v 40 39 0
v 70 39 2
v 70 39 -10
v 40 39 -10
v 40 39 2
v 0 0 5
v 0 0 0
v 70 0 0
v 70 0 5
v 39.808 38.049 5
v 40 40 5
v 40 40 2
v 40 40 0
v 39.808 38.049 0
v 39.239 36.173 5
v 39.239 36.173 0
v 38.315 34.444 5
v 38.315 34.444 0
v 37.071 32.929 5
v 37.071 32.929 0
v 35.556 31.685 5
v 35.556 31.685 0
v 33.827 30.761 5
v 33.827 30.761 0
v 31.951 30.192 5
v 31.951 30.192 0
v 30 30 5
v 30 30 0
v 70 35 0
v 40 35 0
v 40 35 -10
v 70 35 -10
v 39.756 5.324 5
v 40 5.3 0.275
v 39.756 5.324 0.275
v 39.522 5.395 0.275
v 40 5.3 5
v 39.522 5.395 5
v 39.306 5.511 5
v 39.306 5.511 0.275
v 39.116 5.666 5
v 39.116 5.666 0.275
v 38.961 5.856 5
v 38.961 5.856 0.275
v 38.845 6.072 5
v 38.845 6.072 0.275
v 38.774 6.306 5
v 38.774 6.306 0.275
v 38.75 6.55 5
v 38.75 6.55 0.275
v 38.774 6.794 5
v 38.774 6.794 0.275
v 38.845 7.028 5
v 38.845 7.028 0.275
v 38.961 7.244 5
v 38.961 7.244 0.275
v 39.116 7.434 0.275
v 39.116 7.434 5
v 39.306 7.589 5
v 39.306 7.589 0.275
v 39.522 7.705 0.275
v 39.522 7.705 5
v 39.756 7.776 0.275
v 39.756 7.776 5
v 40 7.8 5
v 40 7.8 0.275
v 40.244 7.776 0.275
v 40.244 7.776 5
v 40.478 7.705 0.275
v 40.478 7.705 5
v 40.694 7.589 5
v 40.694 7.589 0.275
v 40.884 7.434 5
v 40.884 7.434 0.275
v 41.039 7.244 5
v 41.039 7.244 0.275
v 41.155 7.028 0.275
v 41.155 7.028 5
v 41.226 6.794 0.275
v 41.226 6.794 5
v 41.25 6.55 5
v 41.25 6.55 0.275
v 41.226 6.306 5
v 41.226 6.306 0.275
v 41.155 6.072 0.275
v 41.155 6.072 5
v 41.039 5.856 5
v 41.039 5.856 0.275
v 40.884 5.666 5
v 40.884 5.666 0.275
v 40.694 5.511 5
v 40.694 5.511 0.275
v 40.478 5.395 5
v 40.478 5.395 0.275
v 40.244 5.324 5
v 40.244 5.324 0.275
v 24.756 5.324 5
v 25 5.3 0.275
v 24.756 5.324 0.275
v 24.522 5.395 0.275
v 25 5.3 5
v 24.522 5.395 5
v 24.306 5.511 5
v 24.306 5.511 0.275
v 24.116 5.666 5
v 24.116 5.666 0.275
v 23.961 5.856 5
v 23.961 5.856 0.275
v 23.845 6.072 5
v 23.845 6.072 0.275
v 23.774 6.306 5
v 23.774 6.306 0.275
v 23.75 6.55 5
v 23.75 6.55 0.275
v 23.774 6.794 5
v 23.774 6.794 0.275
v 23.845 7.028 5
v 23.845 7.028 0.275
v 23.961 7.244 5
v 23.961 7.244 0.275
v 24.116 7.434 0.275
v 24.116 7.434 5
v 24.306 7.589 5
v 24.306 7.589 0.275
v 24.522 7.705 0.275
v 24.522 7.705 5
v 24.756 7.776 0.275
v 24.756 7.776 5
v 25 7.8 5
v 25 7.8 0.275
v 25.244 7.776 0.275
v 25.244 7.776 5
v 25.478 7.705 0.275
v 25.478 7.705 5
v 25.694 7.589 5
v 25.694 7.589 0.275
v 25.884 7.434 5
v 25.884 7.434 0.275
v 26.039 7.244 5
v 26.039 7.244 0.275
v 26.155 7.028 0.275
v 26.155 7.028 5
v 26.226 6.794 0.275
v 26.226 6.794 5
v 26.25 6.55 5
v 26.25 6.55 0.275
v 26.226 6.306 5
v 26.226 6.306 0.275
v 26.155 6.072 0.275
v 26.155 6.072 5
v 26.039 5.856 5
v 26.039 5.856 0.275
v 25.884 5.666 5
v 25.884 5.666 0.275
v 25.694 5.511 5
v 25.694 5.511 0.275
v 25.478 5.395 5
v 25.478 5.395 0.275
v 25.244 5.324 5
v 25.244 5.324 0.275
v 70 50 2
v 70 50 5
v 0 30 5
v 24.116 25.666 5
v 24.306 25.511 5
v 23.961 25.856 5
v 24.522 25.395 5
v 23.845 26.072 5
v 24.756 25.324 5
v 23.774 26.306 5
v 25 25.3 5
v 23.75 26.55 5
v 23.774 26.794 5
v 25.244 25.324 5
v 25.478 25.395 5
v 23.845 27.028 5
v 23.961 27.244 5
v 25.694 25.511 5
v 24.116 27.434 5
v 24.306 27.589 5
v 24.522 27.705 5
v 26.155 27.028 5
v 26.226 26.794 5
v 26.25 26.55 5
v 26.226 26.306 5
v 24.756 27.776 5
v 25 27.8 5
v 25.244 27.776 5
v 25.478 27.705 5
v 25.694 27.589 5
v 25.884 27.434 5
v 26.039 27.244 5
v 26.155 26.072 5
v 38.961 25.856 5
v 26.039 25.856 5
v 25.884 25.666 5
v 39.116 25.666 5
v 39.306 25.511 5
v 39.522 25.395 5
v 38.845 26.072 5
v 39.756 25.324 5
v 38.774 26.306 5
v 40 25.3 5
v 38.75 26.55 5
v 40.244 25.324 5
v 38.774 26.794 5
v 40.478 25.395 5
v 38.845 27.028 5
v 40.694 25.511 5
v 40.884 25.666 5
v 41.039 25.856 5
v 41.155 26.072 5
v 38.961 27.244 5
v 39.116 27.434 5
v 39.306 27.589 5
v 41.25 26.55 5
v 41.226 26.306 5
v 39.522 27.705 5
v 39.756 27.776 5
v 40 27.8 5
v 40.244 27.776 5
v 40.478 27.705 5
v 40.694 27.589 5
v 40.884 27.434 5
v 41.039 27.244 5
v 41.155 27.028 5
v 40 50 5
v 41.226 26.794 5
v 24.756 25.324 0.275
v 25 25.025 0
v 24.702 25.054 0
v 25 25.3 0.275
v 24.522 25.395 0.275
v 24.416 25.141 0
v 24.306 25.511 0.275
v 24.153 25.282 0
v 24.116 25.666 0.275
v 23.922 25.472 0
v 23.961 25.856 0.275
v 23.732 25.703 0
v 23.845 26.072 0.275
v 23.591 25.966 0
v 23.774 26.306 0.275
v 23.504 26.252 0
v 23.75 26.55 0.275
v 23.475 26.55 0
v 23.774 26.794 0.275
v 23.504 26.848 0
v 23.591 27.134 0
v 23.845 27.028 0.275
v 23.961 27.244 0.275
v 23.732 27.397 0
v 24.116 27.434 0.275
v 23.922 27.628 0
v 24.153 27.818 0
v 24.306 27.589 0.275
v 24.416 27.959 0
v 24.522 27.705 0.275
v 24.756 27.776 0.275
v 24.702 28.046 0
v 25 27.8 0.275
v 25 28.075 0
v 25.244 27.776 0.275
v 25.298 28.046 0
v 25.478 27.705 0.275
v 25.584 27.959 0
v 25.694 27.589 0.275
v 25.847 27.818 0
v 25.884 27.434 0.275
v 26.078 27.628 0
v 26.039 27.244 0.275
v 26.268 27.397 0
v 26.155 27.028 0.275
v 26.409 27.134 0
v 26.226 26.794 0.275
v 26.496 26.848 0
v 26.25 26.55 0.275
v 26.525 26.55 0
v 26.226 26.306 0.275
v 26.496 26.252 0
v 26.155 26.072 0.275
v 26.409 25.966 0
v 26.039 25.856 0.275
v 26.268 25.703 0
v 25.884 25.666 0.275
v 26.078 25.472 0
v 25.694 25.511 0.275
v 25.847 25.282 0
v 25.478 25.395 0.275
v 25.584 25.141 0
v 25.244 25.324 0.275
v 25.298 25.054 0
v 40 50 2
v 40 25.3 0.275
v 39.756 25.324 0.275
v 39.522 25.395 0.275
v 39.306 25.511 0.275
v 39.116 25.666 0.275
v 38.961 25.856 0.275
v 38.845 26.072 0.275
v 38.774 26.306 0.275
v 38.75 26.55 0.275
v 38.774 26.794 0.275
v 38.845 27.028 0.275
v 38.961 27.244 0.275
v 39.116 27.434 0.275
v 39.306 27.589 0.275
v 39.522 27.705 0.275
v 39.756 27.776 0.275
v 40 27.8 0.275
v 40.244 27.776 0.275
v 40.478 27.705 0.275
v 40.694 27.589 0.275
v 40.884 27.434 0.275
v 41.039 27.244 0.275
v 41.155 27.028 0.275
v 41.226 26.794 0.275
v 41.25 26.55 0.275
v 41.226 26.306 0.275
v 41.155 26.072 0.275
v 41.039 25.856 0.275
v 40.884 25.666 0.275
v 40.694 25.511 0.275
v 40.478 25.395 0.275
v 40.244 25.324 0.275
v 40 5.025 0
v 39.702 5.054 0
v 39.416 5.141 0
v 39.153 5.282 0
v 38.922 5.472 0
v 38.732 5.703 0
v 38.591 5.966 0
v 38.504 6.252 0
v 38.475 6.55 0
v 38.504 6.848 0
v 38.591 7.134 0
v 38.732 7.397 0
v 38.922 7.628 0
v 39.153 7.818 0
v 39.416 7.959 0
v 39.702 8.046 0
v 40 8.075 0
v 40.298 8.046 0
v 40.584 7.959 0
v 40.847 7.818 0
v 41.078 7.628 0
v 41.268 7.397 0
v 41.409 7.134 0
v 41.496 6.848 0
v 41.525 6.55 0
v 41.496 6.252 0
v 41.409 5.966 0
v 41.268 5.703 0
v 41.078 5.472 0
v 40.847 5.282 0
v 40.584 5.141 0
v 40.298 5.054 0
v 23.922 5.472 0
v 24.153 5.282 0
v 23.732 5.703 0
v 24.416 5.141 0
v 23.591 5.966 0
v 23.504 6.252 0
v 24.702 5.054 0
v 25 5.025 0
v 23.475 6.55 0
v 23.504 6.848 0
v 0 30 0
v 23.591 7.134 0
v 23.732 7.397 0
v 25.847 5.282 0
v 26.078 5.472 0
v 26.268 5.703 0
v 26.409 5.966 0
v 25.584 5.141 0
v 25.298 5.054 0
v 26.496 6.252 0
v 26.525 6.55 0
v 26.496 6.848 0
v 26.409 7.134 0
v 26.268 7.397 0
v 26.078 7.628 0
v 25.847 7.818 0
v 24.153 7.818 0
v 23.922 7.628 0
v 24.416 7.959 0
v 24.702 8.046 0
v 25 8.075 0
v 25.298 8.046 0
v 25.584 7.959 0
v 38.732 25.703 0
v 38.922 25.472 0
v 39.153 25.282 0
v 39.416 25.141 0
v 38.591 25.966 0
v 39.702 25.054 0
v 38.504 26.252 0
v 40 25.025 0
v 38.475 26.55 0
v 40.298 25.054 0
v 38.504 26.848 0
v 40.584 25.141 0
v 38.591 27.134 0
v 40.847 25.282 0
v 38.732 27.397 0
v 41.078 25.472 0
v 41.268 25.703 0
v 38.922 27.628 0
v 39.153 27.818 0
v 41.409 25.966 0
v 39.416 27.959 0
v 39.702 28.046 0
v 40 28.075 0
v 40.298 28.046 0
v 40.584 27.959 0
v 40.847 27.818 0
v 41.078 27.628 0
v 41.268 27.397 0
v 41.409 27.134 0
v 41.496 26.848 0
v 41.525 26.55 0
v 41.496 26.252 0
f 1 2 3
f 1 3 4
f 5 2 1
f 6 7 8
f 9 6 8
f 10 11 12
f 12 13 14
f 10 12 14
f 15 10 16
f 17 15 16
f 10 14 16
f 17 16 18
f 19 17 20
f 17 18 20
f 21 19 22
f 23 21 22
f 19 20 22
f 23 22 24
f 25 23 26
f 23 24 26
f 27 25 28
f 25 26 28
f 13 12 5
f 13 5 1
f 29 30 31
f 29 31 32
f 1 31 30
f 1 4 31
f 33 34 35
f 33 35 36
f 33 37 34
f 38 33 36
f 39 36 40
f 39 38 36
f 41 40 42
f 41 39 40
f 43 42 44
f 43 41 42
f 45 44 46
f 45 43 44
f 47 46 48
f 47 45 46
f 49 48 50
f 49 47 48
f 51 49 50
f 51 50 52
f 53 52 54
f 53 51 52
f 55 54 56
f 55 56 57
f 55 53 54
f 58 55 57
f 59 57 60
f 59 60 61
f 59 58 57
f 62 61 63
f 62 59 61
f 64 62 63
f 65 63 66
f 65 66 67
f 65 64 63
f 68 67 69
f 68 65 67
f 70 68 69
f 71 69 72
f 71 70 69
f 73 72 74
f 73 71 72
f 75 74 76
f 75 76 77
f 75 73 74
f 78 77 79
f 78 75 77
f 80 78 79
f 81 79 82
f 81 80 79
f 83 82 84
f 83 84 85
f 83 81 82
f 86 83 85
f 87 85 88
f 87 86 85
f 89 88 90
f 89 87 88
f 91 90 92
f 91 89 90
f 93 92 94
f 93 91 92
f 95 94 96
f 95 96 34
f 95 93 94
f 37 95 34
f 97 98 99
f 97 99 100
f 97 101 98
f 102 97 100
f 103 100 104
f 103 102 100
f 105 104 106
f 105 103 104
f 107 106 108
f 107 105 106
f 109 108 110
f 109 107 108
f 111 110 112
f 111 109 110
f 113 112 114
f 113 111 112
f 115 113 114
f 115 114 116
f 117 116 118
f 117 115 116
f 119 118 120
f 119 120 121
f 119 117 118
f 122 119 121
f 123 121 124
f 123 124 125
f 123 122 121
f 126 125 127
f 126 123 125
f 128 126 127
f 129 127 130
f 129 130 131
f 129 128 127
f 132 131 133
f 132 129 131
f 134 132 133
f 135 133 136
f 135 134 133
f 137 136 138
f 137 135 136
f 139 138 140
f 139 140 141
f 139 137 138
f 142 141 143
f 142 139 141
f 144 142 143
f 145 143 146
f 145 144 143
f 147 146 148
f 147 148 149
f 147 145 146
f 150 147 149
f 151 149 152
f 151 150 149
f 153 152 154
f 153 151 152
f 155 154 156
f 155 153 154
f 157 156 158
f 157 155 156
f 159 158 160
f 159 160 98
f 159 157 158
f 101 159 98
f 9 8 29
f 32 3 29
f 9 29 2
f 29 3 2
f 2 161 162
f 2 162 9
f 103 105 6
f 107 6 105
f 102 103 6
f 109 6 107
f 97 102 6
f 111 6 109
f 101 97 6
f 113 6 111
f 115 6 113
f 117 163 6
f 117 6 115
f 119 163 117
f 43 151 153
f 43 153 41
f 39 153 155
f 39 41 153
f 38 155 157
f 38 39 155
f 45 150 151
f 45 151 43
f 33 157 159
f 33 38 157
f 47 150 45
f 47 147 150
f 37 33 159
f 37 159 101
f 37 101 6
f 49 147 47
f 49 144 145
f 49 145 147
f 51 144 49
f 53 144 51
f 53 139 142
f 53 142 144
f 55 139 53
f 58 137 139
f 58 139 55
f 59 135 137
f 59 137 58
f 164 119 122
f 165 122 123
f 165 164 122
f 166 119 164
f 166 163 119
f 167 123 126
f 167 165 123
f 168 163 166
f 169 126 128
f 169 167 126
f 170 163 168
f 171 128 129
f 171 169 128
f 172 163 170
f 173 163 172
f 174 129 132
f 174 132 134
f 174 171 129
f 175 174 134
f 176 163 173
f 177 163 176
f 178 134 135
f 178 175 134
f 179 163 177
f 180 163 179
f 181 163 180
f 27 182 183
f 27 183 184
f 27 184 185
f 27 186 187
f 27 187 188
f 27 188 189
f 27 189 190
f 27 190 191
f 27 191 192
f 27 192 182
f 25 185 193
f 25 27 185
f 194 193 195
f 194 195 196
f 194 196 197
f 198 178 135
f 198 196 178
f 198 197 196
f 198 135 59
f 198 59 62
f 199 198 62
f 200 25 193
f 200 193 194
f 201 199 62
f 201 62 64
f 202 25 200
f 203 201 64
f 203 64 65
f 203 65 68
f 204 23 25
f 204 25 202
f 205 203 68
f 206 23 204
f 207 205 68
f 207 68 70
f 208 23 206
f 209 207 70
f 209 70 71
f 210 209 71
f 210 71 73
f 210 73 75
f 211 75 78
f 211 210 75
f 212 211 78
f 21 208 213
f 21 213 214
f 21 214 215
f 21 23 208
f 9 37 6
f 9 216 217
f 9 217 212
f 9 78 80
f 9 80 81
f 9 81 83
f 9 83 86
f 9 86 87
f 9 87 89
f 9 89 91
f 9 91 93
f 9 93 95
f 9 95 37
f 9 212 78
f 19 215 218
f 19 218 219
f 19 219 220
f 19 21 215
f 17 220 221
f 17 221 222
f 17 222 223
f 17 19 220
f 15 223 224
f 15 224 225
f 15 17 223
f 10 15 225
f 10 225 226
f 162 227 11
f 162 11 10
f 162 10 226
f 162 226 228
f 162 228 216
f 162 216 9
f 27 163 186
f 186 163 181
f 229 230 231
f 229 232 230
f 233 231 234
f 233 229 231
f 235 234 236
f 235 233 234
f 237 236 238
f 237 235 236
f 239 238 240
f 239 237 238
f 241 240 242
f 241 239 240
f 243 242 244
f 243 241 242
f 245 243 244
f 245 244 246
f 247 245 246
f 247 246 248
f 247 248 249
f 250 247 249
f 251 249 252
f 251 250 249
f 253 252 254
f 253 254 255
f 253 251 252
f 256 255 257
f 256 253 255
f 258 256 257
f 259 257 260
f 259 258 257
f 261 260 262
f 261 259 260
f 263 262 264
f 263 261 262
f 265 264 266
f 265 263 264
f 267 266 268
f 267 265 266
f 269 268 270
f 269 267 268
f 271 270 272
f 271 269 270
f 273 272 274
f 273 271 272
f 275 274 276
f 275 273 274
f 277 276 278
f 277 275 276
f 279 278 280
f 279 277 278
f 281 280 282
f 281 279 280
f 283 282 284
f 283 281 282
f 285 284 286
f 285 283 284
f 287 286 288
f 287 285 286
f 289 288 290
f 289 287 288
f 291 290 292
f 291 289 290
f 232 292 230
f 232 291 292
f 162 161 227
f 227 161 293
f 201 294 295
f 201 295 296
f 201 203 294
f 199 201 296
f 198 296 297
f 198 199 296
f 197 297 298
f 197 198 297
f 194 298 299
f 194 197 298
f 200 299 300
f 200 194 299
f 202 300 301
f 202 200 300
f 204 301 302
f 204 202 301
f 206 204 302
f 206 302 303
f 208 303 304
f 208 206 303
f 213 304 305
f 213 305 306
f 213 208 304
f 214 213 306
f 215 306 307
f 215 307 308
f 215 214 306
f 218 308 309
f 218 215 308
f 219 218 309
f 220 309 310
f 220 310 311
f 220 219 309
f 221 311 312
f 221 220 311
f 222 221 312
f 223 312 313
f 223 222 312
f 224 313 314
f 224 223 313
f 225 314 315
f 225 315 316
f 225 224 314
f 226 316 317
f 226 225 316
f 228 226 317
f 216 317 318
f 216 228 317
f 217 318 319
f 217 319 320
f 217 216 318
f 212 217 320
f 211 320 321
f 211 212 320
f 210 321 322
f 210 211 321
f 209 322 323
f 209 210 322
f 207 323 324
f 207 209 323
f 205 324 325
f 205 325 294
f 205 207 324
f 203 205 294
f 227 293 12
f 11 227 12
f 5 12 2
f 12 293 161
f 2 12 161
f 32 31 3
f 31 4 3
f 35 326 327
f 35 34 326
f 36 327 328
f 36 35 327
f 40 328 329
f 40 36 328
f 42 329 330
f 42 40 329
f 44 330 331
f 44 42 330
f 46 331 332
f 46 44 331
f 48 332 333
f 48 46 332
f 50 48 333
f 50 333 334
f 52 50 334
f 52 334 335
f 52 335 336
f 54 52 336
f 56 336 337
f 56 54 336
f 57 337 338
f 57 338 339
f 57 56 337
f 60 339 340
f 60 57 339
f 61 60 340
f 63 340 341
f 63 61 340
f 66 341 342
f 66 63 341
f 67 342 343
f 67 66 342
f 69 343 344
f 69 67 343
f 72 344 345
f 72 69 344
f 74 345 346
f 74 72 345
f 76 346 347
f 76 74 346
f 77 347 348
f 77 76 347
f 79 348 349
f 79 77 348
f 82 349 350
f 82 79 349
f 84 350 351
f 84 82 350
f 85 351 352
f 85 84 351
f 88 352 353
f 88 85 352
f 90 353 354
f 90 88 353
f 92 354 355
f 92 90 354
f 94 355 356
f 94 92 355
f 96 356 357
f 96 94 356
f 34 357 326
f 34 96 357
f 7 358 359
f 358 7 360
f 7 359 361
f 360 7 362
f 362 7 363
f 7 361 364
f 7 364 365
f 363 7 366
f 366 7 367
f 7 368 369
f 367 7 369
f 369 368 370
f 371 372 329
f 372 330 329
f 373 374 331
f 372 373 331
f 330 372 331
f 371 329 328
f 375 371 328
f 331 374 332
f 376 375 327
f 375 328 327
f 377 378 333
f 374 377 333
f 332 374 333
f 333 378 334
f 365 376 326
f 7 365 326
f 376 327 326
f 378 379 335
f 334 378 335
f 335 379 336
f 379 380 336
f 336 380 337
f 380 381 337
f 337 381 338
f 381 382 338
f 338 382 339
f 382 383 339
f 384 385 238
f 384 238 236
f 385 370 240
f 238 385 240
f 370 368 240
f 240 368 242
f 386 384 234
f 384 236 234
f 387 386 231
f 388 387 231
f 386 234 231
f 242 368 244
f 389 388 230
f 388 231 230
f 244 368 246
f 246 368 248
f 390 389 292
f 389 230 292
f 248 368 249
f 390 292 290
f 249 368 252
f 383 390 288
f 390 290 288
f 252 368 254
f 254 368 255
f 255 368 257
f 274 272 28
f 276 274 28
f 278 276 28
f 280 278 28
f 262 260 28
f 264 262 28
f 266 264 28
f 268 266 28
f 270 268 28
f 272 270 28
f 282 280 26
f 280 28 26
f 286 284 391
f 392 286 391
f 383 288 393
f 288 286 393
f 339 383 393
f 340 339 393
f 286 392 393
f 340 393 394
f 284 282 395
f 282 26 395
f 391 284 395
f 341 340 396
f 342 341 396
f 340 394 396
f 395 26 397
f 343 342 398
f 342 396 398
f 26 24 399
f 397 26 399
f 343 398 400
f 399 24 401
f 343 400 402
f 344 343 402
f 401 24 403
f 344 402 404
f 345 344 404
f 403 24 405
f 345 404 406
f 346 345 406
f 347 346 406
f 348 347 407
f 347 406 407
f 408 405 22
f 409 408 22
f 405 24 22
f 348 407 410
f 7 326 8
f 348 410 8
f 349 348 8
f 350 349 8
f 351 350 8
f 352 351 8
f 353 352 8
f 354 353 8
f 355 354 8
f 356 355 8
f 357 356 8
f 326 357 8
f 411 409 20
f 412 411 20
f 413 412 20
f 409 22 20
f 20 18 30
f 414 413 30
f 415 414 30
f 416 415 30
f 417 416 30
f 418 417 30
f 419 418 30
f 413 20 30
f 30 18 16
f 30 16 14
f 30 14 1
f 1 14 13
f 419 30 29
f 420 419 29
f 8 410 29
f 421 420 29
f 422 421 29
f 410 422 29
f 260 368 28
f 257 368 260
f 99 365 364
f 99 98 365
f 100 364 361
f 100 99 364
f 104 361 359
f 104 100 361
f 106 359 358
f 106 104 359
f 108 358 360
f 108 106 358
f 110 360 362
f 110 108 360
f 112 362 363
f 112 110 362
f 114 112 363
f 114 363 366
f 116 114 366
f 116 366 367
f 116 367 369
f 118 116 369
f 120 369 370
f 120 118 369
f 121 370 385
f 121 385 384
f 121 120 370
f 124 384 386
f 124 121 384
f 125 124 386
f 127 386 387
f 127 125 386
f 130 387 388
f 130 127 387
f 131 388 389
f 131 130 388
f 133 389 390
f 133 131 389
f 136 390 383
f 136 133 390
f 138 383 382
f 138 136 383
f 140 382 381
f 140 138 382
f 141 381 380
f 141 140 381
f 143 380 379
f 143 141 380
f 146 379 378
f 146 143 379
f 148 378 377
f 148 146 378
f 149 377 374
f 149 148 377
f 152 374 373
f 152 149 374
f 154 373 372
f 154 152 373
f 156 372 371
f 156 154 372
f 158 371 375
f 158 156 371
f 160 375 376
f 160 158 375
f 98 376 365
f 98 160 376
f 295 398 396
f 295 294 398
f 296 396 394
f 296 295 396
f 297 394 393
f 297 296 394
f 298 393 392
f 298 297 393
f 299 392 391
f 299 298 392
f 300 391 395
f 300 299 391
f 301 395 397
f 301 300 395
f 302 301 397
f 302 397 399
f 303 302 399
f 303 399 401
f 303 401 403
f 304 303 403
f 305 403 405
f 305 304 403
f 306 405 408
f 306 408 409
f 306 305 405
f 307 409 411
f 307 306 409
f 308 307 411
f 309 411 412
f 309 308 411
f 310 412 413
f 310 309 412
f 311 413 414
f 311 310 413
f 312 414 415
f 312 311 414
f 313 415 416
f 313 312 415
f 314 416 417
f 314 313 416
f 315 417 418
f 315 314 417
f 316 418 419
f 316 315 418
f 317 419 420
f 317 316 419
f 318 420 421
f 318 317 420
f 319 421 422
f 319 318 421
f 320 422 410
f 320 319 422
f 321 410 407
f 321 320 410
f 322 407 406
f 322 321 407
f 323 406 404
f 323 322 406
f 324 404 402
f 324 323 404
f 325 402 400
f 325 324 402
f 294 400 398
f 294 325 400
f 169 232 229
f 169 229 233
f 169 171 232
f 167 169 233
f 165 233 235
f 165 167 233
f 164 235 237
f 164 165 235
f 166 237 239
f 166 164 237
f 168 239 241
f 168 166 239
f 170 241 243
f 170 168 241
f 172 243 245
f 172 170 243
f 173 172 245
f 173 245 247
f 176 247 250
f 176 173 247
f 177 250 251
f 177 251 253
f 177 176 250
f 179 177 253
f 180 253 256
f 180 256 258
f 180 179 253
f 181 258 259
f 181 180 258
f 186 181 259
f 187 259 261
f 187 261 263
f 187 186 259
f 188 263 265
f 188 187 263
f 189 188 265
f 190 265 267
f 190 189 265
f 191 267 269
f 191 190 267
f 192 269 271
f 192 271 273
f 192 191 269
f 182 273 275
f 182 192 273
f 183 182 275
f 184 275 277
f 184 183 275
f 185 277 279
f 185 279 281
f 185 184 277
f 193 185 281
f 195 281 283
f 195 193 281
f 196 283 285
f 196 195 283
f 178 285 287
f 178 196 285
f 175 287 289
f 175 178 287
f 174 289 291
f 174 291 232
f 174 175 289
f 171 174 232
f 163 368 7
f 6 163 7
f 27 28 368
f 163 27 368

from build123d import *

# Parameters (mm, degrees)
BODY_DEPTH           = 5
LPATTERN1_COUNT      = 2
LPATTERN1_PITCH      = 15
LPATTERN1_COUNT_DIR2 = 2
LPATTERN1_PITCH_DIR2 = 20
SKETCH4_W            = 30
SKETCH4_H            = 2
CUT_EXTRUDE2_DEPTH   = 12
SKETCH5_W            = 30
SKETCH5_H            = 1
BOSS_EXTRUDE3_DEPTH  = 12
SKETCH6_W            = 30
SKETCH6_H            = 10
BOSS_EXTRUDE4_DEPTH  = 3


with BuildPart() as part:
    # Sketch1 → Body (new body)
    with BuildSketch(Plane.XY):
        with BuildLine():
            Line((0, 0), (70, 0))
            Line((70, 0), (70, 50))
            Line((70, 50), (40, 50))
            Line((40, 50), (40, 40))
            ThreePointArc((40, 40), (37.071067812, 32.928932188), (30, 30))
            Line((30, 30), (0, 30))
            Line((0, 30), (0, 0))
        make_face()
    extrude(amount=BODY_DEPTH)

    # Sketch8 → M3x0.5 Tapped Hole1 (revolve, cut)
    with BuildSketch(Plane(origin=(25, 6.55, 5), x_dir=(0, -1, 0), z_dir=(1, 0, 0))):
        Polygon((0, 0), (0, 5), (1.525, 5), (1.25, 4.725), (1.25, 0), align=None)
    m3x0_5_tapped_hole1 = revolve(axis=Axis((25, 6.55, 11.35), (0, 0, -1)), mode=Mode.SUBTRACT)

    # LPattern1: M3x0.5 Tapped Hole1 2 × 2
    with Locations(*[(i * LPATTERN1_PITCH, j * LPATTERN1_PITCH_DIR2, 0) for i in range(LPATTERN1_COUNT) for j in range(LPATTERN1_COUNT_DIR2) if (i, j) != (0, 0)]):
        add(m3x0_5_tapped_hole1, mode=Mode.SUBTRACT)

    # Sketch4 → Cut-Extrude2 (cut)
    with BuildSketch(Plane(origin=(0, 50, 0), x_dir=(1, 0, 0), z_dir=(0, 1, 0))):
        with Locations((55, -1)):
            Rectangle(SKETCH4_W, SKETCH4_H)
    extrude(amount=-CUT_EXTRUDE2_DEPTH, mode=Mode.SUBTRACT)

    # Sketch5 → Boss-Extrude3 (add)
    with BuildSketch(Plane(origin=(0, 0, 2), x_dir=(-1, 0, 0), z_dir=(0, 0, -1))):
        with Locations((-55, 38.5)):
            Rectangle(SKETCH5_W, SKETCH5_H)
    extrude(amount=BOSS_EXTRUDE3_DEPTH)

    # Sketch6 → Boss-Extrude4 (add)
    with BuildSketch(Plane.XZ.offset(-38)):
        with Locations((55, -5)):
            Rectangle(SKETCH6_W, SKETCH6_H)
    extrude(amount=BOSS_EXTRUDE4_DEPTH)


solid = part.part
